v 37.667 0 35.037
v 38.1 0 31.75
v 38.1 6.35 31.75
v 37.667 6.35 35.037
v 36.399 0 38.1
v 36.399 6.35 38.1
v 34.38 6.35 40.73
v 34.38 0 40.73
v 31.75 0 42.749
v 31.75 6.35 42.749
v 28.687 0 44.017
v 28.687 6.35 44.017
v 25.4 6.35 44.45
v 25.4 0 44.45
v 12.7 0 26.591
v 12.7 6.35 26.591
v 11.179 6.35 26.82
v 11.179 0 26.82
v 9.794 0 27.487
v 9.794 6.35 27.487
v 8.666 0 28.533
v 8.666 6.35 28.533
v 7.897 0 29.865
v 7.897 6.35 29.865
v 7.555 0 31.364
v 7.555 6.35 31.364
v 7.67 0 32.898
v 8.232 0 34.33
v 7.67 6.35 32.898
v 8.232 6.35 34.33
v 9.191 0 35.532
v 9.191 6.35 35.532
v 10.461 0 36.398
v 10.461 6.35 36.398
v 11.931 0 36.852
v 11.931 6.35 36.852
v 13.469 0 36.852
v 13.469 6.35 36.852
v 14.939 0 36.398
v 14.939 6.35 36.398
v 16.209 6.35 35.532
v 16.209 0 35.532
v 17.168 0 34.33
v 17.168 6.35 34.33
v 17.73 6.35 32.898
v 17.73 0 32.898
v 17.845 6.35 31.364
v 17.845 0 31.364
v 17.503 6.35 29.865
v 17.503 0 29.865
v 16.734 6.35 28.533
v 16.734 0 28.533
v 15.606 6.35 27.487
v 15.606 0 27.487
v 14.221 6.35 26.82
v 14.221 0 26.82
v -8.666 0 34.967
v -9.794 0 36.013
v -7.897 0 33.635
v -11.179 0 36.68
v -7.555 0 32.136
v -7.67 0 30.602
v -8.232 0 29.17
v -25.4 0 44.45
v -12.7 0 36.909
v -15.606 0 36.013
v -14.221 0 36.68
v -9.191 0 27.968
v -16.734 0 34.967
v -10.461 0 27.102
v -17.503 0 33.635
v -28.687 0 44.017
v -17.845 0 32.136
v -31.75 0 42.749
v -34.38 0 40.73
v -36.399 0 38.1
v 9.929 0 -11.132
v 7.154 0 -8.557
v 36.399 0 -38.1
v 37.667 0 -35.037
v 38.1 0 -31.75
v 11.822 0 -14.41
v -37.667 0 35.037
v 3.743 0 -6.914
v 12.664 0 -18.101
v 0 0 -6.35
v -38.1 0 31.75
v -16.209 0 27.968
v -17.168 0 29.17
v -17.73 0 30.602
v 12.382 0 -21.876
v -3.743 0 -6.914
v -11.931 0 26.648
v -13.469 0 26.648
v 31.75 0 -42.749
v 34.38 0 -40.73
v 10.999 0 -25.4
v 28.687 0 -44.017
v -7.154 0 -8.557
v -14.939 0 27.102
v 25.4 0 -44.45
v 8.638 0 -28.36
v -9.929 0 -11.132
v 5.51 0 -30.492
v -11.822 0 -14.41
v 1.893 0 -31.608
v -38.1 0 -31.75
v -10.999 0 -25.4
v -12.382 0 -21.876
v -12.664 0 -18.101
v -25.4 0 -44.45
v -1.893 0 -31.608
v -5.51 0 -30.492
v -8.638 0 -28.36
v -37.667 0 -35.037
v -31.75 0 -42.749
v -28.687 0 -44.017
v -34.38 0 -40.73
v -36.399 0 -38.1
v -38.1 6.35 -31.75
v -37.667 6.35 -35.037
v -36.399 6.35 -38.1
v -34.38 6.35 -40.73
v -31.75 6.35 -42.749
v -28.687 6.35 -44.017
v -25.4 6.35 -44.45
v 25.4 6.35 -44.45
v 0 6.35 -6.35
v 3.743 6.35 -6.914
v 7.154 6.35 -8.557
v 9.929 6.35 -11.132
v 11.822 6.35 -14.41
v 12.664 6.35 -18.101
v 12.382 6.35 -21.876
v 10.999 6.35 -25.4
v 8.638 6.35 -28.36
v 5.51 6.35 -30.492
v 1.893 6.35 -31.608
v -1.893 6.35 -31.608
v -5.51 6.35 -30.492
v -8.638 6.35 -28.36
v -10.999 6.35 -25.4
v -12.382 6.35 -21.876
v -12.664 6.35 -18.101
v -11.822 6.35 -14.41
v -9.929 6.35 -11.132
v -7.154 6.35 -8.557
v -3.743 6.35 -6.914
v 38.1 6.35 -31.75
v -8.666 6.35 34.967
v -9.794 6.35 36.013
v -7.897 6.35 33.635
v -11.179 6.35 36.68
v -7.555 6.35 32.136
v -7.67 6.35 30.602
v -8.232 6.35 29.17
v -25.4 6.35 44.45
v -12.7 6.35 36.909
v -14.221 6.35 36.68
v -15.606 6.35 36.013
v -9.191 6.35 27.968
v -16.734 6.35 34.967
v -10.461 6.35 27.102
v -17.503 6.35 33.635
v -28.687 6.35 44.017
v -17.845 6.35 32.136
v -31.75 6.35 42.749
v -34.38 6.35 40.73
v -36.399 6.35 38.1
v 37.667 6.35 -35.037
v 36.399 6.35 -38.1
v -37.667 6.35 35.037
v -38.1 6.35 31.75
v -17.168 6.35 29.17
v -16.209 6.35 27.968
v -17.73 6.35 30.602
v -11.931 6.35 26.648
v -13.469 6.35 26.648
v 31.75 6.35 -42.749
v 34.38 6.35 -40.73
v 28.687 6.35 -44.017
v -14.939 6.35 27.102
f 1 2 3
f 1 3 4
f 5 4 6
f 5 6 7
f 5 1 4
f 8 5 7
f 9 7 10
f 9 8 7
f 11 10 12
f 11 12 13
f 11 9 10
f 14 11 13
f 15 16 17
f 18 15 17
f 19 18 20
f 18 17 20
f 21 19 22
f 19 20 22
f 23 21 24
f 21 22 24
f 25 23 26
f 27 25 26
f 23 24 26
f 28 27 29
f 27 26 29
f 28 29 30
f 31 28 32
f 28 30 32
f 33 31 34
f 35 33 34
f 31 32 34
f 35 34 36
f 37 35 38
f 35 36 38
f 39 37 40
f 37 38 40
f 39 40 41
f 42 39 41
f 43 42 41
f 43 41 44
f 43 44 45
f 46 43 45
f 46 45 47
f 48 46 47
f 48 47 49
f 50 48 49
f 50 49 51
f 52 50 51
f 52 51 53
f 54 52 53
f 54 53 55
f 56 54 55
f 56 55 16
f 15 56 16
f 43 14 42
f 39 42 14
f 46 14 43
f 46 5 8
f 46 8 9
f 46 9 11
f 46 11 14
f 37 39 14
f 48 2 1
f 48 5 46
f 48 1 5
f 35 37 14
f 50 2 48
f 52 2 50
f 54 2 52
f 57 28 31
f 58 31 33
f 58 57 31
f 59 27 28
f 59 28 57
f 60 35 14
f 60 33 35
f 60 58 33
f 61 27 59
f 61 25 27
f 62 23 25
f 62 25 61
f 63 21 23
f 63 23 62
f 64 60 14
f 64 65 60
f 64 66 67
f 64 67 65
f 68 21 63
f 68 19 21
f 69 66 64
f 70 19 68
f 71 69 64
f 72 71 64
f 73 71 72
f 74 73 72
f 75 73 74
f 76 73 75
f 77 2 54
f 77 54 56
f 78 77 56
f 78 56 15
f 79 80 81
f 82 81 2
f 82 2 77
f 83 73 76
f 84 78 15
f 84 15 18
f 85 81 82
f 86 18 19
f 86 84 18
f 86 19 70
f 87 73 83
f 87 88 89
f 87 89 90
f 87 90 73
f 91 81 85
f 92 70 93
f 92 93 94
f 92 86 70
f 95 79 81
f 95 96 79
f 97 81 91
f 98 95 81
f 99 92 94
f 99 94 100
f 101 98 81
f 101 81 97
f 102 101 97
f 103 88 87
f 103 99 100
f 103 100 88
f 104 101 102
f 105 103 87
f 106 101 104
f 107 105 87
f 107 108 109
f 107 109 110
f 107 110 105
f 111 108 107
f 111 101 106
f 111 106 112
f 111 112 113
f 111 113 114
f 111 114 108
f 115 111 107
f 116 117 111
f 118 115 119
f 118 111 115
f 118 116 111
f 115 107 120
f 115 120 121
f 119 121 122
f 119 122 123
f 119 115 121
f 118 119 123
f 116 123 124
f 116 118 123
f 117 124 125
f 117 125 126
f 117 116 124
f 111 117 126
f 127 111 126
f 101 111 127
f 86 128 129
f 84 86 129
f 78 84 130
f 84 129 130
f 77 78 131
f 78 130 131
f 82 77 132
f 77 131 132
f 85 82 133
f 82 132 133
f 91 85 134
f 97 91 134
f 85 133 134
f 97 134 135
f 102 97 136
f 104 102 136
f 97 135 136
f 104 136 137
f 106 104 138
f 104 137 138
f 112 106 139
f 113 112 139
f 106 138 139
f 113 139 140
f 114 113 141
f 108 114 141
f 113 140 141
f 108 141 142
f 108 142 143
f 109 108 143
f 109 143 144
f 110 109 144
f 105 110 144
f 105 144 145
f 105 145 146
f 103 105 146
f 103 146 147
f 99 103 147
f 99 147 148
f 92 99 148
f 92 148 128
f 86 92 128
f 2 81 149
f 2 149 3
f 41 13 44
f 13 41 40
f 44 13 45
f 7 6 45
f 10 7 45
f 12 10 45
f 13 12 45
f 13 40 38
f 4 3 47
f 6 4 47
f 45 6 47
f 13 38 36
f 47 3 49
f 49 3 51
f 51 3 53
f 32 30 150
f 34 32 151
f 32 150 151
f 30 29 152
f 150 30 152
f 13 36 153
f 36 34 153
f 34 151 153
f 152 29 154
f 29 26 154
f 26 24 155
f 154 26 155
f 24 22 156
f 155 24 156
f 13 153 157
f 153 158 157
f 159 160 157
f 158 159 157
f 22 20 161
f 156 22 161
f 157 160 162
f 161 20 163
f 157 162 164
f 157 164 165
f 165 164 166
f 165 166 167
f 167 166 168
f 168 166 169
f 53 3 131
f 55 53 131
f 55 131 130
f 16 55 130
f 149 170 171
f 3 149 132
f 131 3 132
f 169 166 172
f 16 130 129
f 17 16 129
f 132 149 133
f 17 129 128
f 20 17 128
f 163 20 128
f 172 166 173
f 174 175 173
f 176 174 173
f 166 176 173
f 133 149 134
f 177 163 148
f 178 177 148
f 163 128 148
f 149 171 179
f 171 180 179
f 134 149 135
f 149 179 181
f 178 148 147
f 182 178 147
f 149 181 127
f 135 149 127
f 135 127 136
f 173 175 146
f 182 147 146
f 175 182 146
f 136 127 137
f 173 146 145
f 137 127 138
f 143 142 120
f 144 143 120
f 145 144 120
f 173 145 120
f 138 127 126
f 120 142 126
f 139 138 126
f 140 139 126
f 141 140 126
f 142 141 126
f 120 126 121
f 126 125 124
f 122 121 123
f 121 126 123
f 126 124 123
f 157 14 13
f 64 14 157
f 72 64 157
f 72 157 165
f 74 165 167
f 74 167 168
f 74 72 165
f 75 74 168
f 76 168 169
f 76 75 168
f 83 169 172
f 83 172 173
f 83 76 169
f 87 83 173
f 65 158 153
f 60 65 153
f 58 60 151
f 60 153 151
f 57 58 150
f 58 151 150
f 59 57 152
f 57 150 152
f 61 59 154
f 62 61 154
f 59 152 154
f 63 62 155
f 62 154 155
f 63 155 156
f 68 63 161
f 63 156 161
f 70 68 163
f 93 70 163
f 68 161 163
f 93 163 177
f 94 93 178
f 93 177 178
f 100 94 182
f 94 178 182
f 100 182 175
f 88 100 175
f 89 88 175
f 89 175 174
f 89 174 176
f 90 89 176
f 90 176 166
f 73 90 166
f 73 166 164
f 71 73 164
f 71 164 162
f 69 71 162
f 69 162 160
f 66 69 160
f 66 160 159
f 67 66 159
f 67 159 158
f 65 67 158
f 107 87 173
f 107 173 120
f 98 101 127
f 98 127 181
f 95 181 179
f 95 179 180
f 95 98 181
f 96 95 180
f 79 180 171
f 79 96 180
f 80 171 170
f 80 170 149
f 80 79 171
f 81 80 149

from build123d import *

# Parameters (mm, degrees)
BOSS_EXTRUDE1_DEPTH = 6.35
SKETCH2_R           = 12.7
SKETCH2_R_2         = 5.159375
CUT_EXTRUDE1_DEPTH  = 59.887477446


with BuildPart() as part:
    # Sketch1 → Boss-Extrude1 (new body)
    with BuildSketch(Plane(origin=(0, 0, 0), x_dir=(1, 0, 0), z_dir=(0, 1, 0))):
        with BuildLine():
            Line((-25.4, 44.45), (25.4, 44.45))
            ThreePointArc((25.4, 44.45), (34.380256121, 40.730256121), (38.1, 31.75))
            Line((38.1, 31.75), (38.1, -31.75))
            ThreePointArc((38.1, -31.75), (34.380256121, -40.730256121), (25.4, -44.45))
            Line((25.4, -44.45), (-25.4, -44.45))
            ThreePointArc((-25.4, -44.45), (-34.380256121, -40.730256121), (-38.1, -31.75))
            Line((-38.1, -31.75), (-38.1, 31.75))
            ThreePointArc((-38.1, 31.75), (-34.380256121, 40.730256121), (-25.4, 44.45))
        make_face()
    extrude(amount=BOSS_EXTRUDE1_DEPTH)

    # Sketch2 → Cut-Extrude1 (cut, through all)
    with BuildSketch(Plane(origin=(0, 6.35, 0), x_dir=(1, 0, 0), z_dir=(0, 1, 0))):
        with Locations(Location((0, 19.05, 0), (0, 0, 270))):
            Circle(SKETCH2_R)
        with Locations(Location((-12.7, -31.75, 0), (0, 0, 270))):
            Circle(SKETCH2_R_2)
        with Locations(Location((12.7, -31.75, 0), (0, 0, 90))):
            Circle(SKETCH2_R_2)
    extrude(amount=-CUT_EXTRUDE1_DEPTH, mode=Mode.SUBTRACT)


solid = part.part
